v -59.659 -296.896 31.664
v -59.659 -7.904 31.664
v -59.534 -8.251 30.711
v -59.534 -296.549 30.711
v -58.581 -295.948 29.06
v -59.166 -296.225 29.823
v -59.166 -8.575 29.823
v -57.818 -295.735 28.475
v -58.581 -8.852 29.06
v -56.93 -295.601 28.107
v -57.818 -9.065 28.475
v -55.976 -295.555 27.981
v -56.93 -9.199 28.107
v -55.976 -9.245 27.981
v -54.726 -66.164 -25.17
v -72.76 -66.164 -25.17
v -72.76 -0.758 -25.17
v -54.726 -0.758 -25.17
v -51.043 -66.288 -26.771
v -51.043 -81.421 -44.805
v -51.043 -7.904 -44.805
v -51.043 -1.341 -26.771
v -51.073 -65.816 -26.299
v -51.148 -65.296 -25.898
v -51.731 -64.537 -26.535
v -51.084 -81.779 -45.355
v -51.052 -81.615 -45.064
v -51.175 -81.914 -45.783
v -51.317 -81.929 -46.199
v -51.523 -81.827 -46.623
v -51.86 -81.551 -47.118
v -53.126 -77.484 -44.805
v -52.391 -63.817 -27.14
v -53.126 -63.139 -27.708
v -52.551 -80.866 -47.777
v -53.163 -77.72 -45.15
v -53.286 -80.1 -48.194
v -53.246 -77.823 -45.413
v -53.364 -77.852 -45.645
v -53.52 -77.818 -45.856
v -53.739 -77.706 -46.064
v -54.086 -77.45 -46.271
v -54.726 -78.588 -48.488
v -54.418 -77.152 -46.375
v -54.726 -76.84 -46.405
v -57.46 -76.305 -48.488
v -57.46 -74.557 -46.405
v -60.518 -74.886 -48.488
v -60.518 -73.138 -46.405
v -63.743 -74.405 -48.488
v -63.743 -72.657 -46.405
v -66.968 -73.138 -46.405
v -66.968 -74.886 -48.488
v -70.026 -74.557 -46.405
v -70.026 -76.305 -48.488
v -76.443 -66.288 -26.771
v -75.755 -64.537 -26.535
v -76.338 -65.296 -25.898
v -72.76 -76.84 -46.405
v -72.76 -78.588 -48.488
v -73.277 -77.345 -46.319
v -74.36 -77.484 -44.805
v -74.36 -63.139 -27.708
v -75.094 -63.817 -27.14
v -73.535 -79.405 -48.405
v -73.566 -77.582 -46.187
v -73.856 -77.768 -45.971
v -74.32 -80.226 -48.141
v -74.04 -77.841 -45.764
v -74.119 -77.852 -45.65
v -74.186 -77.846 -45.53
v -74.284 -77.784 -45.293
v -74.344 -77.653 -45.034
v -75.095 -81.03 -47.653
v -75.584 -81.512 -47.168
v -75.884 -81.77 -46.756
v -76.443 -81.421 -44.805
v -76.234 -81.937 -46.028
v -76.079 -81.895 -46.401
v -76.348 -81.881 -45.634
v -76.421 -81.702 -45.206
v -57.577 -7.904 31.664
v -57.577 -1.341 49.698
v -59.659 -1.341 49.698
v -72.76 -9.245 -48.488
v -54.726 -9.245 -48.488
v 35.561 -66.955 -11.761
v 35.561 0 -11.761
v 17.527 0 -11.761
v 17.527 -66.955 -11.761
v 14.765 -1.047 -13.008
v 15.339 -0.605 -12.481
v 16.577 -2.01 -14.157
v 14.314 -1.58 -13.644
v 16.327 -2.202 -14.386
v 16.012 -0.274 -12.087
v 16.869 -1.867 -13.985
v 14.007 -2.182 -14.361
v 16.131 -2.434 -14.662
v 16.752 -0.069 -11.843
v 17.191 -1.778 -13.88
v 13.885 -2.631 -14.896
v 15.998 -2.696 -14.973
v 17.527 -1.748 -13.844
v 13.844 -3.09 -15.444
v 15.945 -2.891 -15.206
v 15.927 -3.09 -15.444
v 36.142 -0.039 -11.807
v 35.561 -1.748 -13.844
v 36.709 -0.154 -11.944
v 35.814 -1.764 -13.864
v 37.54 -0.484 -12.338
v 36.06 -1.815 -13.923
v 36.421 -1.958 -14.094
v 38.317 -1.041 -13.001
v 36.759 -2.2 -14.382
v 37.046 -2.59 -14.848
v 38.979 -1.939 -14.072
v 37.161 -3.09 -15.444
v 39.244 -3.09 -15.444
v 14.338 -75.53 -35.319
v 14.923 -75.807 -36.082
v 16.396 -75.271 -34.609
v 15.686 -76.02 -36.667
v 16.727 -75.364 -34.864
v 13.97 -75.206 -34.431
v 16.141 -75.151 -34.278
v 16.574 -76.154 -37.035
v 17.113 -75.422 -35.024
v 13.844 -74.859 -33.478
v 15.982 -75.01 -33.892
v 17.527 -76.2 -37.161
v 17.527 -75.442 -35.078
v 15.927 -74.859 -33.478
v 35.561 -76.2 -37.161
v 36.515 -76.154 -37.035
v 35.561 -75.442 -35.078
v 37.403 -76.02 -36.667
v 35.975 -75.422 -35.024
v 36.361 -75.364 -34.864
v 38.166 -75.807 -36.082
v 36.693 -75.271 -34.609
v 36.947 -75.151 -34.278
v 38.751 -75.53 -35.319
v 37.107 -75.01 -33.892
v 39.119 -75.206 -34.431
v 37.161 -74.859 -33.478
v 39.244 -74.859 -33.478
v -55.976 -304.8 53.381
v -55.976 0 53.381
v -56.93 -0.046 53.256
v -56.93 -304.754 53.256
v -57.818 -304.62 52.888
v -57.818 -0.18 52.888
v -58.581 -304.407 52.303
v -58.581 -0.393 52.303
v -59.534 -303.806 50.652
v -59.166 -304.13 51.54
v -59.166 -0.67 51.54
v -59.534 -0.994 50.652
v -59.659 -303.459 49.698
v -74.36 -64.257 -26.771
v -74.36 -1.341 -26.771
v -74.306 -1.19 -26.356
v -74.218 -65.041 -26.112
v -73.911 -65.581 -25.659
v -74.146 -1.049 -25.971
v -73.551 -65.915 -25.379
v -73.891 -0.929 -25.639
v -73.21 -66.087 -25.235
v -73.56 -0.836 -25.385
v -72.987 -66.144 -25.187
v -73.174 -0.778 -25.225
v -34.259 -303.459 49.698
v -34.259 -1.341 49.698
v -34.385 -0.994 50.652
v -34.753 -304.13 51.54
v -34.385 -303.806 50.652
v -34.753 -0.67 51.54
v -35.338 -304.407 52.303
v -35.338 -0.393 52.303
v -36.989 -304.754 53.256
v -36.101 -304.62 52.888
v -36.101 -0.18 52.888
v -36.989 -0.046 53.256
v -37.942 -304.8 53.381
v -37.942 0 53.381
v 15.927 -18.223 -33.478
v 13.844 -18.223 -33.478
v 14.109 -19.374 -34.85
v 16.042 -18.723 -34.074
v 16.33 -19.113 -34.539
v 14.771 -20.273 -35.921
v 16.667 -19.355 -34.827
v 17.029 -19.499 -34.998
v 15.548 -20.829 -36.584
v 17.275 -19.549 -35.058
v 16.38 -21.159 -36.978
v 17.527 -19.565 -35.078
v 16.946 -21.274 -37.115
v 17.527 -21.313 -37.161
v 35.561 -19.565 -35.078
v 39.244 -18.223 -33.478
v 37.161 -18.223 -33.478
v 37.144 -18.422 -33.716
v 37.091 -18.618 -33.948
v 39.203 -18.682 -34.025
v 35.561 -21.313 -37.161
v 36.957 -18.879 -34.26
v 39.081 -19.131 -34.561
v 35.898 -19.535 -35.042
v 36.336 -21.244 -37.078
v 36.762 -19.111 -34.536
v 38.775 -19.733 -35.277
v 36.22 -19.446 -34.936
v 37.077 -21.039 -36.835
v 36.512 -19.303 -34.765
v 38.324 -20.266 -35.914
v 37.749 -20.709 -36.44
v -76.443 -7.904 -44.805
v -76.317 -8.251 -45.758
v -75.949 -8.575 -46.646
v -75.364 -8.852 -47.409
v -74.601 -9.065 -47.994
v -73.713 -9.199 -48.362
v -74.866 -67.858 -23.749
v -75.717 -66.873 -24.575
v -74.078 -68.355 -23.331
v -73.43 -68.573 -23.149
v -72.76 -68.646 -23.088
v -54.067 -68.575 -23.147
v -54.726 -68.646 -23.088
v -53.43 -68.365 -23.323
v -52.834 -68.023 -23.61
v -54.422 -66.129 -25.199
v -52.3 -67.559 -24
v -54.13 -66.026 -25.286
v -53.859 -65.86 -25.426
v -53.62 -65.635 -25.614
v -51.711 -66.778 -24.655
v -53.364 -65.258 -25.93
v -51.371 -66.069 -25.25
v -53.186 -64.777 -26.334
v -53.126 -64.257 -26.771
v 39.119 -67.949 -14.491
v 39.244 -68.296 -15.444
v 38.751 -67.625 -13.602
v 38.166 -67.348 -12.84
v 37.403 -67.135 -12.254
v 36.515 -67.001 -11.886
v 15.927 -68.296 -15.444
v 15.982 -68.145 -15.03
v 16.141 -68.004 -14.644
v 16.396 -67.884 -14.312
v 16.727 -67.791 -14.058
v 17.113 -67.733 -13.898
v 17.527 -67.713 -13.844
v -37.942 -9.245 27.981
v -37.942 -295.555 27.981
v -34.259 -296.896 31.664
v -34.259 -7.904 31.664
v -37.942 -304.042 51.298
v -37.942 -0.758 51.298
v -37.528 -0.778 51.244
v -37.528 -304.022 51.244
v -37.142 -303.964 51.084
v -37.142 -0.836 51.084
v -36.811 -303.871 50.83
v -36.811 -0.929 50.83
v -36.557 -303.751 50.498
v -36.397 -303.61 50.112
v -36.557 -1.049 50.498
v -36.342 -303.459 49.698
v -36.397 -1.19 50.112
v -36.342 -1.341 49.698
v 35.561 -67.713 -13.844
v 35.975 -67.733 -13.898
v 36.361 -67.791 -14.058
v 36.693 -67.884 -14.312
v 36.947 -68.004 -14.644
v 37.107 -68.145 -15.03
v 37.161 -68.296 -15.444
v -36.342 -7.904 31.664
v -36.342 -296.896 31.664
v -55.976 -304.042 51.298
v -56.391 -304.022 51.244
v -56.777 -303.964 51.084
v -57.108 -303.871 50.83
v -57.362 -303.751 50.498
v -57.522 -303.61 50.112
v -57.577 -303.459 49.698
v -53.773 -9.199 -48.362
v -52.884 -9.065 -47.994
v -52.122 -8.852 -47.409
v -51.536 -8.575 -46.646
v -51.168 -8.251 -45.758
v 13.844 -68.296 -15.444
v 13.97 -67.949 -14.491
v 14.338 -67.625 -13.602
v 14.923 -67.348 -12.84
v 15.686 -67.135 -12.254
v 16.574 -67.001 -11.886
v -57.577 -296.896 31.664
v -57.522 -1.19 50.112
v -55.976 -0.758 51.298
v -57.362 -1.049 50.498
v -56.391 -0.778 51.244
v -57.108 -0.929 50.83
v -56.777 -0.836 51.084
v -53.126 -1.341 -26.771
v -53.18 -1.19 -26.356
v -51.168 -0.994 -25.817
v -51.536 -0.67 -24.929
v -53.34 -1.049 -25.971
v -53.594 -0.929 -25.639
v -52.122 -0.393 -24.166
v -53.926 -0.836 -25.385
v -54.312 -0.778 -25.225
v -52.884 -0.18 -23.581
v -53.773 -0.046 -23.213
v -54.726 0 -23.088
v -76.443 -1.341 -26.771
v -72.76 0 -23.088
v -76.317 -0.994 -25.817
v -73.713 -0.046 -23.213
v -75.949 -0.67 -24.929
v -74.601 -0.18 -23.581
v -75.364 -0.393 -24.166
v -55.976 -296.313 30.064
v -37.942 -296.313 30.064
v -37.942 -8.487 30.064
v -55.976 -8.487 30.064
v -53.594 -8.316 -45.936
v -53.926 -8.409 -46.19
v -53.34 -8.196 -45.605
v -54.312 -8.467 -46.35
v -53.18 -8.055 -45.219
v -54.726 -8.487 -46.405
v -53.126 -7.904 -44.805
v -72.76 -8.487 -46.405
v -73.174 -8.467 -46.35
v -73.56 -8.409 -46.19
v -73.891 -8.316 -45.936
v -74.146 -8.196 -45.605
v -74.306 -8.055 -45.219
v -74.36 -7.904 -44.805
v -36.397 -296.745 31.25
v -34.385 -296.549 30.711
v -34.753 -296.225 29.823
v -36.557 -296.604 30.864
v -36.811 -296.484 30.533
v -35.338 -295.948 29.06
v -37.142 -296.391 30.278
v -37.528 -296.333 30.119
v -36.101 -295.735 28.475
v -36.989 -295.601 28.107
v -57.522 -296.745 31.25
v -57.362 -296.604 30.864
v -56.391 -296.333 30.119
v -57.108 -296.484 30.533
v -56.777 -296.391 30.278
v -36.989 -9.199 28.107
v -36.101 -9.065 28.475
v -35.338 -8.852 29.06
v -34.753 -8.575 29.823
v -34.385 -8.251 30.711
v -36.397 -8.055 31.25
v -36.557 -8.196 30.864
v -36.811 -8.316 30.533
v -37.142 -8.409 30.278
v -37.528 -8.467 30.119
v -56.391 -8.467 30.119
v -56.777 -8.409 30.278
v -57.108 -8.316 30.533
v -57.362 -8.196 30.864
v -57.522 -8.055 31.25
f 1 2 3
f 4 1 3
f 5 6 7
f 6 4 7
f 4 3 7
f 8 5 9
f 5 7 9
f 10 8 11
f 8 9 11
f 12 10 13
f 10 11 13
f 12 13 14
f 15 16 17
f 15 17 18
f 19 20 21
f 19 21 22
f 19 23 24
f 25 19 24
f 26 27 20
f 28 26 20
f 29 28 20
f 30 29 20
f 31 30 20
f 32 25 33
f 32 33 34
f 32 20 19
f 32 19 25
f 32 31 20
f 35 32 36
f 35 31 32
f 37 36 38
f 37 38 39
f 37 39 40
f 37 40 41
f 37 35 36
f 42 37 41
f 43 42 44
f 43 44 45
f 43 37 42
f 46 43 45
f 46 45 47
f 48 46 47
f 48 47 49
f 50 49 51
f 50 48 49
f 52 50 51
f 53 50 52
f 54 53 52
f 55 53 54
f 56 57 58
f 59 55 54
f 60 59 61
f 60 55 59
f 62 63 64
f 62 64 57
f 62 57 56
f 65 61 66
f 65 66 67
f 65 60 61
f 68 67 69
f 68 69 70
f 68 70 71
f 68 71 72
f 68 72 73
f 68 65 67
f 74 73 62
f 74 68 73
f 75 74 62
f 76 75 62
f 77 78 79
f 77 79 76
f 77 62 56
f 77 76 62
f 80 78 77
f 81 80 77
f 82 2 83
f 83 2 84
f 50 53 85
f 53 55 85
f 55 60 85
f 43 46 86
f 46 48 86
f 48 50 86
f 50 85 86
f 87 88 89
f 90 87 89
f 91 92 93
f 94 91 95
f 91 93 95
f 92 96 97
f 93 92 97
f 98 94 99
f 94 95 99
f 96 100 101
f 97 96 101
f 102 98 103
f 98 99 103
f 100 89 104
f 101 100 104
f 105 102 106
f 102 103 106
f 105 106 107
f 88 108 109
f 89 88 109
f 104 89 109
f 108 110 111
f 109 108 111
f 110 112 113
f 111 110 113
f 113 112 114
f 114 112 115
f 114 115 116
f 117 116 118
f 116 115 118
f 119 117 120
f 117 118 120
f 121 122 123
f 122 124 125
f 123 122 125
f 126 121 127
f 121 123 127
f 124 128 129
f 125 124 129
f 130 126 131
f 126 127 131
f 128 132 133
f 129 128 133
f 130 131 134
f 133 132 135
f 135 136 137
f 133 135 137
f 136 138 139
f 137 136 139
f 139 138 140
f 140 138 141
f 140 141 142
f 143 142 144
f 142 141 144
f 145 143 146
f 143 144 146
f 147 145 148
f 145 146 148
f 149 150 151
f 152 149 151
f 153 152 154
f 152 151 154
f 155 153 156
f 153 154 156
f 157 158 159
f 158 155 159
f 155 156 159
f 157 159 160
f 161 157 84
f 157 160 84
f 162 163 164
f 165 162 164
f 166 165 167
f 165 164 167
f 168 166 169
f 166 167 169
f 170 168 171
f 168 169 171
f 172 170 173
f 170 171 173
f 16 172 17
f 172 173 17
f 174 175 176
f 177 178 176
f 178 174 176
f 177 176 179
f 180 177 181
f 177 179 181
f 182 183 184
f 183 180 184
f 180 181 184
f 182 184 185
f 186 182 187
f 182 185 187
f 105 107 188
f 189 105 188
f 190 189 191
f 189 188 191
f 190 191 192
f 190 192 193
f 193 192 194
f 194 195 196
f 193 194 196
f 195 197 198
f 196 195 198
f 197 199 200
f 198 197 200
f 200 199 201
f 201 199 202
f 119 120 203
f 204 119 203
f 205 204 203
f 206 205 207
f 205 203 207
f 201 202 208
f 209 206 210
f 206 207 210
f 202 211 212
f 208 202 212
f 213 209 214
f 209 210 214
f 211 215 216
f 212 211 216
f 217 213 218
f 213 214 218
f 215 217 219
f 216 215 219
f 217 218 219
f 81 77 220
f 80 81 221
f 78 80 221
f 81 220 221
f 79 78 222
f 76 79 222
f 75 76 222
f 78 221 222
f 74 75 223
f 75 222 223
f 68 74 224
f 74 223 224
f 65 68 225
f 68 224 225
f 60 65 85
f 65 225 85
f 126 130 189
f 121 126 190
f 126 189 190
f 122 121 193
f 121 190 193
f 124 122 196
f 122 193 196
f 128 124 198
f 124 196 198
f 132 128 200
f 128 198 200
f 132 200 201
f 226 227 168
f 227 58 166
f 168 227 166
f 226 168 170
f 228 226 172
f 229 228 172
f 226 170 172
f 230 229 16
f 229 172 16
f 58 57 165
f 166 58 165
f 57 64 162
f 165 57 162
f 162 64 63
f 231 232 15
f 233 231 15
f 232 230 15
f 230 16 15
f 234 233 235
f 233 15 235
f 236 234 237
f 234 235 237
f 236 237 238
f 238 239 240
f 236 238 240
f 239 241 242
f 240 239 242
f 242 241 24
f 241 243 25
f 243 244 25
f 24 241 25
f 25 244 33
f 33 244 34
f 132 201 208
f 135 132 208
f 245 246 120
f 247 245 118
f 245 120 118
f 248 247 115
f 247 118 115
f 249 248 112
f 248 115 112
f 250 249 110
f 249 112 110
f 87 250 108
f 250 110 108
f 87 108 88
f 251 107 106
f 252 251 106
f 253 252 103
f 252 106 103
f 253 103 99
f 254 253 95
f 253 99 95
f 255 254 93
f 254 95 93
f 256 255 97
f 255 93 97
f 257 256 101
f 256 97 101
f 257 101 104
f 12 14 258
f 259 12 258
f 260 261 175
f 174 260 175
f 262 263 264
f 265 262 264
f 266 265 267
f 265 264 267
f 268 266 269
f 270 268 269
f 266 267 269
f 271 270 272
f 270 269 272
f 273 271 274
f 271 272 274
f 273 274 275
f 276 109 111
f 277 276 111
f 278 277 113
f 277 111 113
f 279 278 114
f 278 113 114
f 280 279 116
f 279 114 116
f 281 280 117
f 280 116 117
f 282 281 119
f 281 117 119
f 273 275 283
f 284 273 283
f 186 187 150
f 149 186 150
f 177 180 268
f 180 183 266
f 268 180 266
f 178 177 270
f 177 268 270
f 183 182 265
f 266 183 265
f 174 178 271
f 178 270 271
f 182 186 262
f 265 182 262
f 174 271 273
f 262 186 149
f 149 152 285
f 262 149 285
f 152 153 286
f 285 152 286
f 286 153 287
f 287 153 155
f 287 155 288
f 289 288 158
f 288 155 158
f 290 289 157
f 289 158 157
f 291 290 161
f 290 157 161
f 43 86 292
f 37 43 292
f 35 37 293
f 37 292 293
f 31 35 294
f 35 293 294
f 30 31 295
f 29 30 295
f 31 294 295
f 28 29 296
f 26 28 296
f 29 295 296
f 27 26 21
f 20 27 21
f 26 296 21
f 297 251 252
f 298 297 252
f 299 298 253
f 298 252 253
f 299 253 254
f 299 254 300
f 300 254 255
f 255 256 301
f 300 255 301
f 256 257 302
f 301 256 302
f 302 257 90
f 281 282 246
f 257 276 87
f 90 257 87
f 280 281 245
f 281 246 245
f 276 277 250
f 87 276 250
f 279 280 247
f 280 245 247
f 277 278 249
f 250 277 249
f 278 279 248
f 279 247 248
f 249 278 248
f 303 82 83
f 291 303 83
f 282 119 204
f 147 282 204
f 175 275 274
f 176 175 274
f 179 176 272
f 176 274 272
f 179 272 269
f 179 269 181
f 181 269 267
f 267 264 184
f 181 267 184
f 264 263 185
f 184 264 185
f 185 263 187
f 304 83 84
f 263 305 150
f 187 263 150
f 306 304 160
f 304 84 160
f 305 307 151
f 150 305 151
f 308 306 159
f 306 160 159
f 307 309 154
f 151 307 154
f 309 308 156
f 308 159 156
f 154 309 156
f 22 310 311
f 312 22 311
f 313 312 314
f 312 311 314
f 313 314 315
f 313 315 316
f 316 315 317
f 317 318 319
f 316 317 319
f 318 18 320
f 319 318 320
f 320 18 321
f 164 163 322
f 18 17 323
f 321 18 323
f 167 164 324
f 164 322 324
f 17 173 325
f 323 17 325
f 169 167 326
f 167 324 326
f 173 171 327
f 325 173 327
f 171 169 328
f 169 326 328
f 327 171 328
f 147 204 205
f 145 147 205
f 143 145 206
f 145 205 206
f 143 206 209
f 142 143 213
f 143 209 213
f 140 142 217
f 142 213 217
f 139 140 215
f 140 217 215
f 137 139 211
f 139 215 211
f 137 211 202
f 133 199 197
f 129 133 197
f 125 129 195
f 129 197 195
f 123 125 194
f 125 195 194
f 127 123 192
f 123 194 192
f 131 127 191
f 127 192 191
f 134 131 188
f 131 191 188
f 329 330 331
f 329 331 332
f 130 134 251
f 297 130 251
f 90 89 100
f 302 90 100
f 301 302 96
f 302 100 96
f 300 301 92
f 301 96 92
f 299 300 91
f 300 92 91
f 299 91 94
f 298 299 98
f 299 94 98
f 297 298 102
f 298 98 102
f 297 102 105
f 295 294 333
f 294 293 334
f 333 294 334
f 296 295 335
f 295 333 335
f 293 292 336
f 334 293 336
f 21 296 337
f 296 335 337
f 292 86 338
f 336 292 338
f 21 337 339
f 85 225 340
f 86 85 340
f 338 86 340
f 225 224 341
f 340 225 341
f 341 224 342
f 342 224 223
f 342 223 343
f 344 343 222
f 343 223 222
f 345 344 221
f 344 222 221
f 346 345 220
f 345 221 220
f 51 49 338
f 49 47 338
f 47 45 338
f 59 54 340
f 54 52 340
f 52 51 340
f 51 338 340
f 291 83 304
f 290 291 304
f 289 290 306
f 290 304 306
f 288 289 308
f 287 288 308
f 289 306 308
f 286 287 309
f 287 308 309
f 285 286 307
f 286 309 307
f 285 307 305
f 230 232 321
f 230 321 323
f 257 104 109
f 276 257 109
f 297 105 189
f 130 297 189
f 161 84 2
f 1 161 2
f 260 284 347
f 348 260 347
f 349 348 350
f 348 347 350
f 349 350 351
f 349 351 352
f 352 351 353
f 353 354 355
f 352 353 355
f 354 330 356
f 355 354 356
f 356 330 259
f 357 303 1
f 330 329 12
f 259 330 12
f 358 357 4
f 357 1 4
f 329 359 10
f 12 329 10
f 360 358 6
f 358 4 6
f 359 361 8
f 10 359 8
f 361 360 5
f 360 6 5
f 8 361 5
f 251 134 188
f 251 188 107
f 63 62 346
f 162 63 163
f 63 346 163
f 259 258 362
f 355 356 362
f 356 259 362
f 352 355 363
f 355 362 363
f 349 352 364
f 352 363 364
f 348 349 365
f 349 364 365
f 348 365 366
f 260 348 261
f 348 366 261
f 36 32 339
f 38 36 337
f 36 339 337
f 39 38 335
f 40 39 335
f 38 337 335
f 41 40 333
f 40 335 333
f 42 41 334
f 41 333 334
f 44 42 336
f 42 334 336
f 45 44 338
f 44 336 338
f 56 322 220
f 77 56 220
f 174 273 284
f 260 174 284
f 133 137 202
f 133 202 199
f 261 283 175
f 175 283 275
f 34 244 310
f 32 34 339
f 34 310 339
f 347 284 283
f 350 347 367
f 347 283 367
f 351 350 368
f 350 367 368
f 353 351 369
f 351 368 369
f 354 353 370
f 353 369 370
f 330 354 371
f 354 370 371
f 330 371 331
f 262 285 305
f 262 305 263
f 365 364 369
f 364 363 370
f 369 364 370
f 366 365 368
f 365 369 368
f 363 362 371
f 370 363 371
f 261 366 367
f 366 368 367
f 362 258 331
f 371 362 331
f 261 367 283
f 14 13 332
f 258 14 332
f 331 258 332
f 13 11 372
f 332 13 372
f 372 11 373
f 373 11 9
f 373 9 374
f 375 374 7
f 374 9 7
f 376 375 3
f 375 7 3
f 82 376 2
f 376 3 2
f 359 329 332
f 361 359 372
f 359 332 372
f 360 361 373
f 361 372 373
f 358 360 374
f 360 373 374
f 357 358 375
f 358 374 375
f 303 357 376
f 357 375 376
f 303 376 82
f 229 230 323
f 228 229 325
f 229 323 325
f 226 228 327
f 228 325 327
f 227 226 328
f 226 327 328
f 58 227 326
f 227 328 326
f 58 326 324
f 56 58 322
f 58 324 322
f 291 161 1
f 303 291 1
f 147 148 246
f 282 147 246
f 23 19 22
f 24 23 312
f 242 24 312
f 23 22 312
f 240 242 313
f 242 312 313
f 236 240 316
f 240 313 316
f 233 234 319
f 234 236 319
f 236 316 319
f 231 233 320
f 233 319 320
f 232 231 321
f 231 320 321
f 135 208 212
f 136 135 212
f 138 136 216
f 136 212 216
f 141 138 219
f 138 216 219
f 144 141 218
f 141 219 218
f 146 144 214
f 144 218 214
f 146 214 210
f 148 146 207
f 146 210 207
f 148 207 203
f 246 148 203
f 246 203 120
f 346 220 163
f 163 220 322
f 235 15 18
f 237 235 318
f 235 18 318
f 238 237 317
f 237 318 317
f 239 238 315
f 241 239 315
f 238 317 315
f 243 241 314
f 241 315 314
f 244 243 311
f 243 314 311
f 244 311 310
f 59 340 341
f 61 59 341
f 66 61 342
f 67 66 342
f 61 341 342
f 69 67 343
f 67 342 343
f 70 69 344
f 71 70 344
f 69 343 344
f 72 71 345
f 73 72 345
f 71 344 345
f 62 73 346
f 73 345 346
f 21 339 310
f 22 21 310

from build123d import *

# Parameters (mm, degrees)
F1_DEPTH  = 304.8
F3_DEPTH  = 101.6
F5_DEPTH  = 25.4
F7_DEPTH  = 25.4
F10_R     = 14.2875
F11_DEPTH = 40.64
F13_DEPTH = 76.2
F15_DEPTH = 25.4


with BuildPart() as f1:
    # F0 (on Front) → F1 (new body)
    with BuildSketch(Plane.XZ):
        with BuildLine():
            Line((-37.9424992715, 53.3812791109), (-55.9764980507, 53.3812791109))
            ThreePointArc((-55.9764980507, 53.3812791109), (-58.5807727574, 52.3025532072), (-59.6594986611, 49.6982785005))
            Line((-59.6594986611, 49.6982785005), (-59.6594986611, 31.6642797213))
            ThreePointArc((-59.6594986611, 31.6642797213), (-58.5807727574, 29.0600050146), (-55.9764980507, 27.9812791109))
            Line((-55.9764980507, 27.9812791109), (-37.9424992715, 27.9812791109))
            ThreePointArc((-37.9424992715, 27.9812791109), (-35.3382245648, 29.0600050146), (-34.2594986611, 31.6642797213))
            Line((-34.2594986611, 31.6642797213), (-34.2594986611, 49.6982785005))
            ThreePointArc((-34.2594986611, 49.6982785005), (-35.3382245648, 52.3025532072), (-37.9424992715, 53.3812791109))
        make_face()
        with BuildLine():
            ThreePointArc((-57.5766980507, 49.6982785005), (-57.108010322, 50.8297907718), (-55.9764980507, 51.2984785005))
            Line((-55.9764980507, 51.2984785005), (-37.9424992715, 51.2984785005))
            ThreePointArc((-37.9424992715, 51.2984785005), (-36.8109870002, 50.8297907718), (-36.3422992715, 49.6982785005))
            Line((-36.3422992715, 49.6982785005), (-36.3422992715, 31.6642797213))
            ThreePointArc((-36.3422992715, 31.6642797213), (-36.8109870002, 30.53276745), (-37.9424992715, 30.0640797213))
            Line((-37.9424992715, 30.0640797213), (-55.9764980507, 30.0640797213))
            ThreePointArc((-55.9764980507, 30.0640797213), (-57.108010322, 30.53276745), (-57.5766980507, 31.6642797213))
            Line((-57.5766980507, 31.6642797213), (-57.5766980507, 49.6982785005))
        make_face(mode=Mode.SUBTRACT)
    extrude(amount=F1_DEPTH)

    # F4 (on face) → F5 (cut, through all)
    with BuildSketch(Plane(origin=(-59.6594986611, 0, 0), x_dir=(0, -1, 0), z_dir=(-1, 0, 0))):
        Polygon((7.9043413554, 31.6642797213), (1.340502595, 49.6982785005), (0, 49.6982785005), (0, 31.6642797213), align=None)
        Polygon((1.340502595, 49.6982785005), (0, 53.3812791109), (0, 49.6982785005), align=None)
        Polygon((9.2448439504, 27.9812791109), (7.9043413554, 31.6642797213), (0, 31.6642797213), (0, 27.9812791109), align=None)
        Polygon((304.8, 53.3812791109), (303.459497405, 49.6982785005), (304.8, 49.6982785005), align=None)
        Polygon((304.8, 49.6982785005), (303.459497405, 49.6982785005), (296.8956586446, 31.6642797213), (304.8, 31.6642797213), align=None)
        Polygon((304.8, 31.6642797213), (296.8956586446, 31.6642797213), (295.5551560496, 27.9812791109), (304.8, 27.9812791109), align=None)
    extrude(amount=-F5_DEPTH, mode=Mode.SUBTRACT)


with BuildPart() as f3:
    # F2 (on Front) → F3 (new body)
    with BuildSketch(Plane.XZ):
        with BuildLine():
            Line((-54.7259064655, -23.0876084745), (-72.7599052448, -23.0876084745))
            ThreePointArc((-72.7599052448, -23.0876084745), (-75.3641799515, -24.1663343782), (-76.4429058552, -26.7706090849))
            Line((-76.4429058552, -26.7706090849), (-76.4429058552, -44.8046078641))
            ThreePointArc((-76.4429058552, -44.8046078641), (-75.3641799515, -47.4088825708), (-72.7599052448, -48.4876084745))
            Line((-72.7599052448, -48.4876084745), (-54.7259064655, -48.4876084745))
            ThreePointArc((-54.7259064655, -48.4876084745), (-52.1216317588, -47.4088825708), (-51.0429058552, -44.8046078641))
            Line((-51.0429058552, -44.8046078641), (-51.0429058552, -26.7706090849))
            ThreePointArc((-51.0429058552, -26.7706090849), (-52.1216317588, -24.1663343782), (-54.7259064655, -23.0876084745))
        make_face()
        with BuildLine():
            ThreePointArc((-74.3601052448, -26.7706090849), (-73.8914175161, -25.6390968136), (-72.7599052448, -25.1704090849))
            Line((-72.7599052448, -25.1704090849), (-54.7259064655, -25.1704090849))
            ThreePointArc((-54.7259064655, -25.1704090849), (-53.5943941943, -25.6390968136), (-53.1257064655, -26.7706090849))
            Line((-53.1257064655, -26.7706090849), (-53.1257064655, -44.8046078641))
            ThreePointArc((-53.1257064655, -44.8046078641), (-53.5943941943, -45.9361201354), (-54.7259064655, -46.4048078641))
            Line((-54.7259064655, -46.4048078641), (-72.7599052448, -46.4048078641))
            ThreePointArc((-72.7599052448, -46.4048078641), (-73.8914175161, -45.9361201354), (-74.3601052448, -44.8046078641))
            Line((-74.3601052448, -44.8046078641), (-74.3601052448, -26.7706090849))
        make_face(mode=Mode.SUBTRACT)
    extrude(amount=F3_DEPTH)

    # F6 (on face) → F7 (cut, through all)
    with BuildSketch(Plane(origin=(-76.4429058552, 0, 0), x_dir=(0, -1, 0), z_dir=(-1, 0, 0))):
        Polygon((1.340502595, -26.7706090849), (0, -26.7706090849), (0, -44.8046078641), (7.9043413554, -44.8046078641), align=None)
        Polygon((7.9043413554, -44.8046078641), (0, -44.8046078641), (0, -48.4876084745), (9.2448439504, -48.4876084745), align=None)
        Polygon((1.340502595, -26.7706090849), (0, -23.0876084745), (0, -26.7706090849), align=None)
        Polygon((80.2868693681, -23.0876084745), (83.3772738219, -26.7706090849), (101.6, -26.7706090849), (101.6, -23.0876084745), align=None)
        Polygon((101.6, -26.7706090849), (83.3772738219, -26.7706090849), (98.5095955462, -44.8046078641), (101.6, -44.8046078641), align=None)
        Polygon((101.6, -44.8046078641), (98.5095955462, -44.8046078641), (101.6, -48.4876084745), align=None)
    extrude(amount=-F7_DEPTH, mode=Mode.SUBTRACT)

    # F10 (on face) → F11 (cut)
    with BuildSketch(Plane(origin=(0, -65.8541589499, -78.4819305158), x_dir=(1, 0, 0), z_dir=(0, 0.6427876097, 0.7660444431))):
        with Locations((-63.7429058552, -40.1174512895)):
            Circle(F10_R)
    extrude(amount=F11_DEPTH, mode=Mode.SUBTRACT)


with BuildPart() as f13:
    # F12 (on Front) → F13 (new body)
    with BuildSketch(Plane.XZ):
        with BuildLine():
            Line((35.5612983663, -11.7608893991), (17.527299587, -11.7608893991))
            ThreePointArc((17.527299587, -11.7608893991), (14.9230248803, -12.8396153027), (13.8442989767, -15.4438900094))
            Line((13.8442989767, -15.4438900094), (13.8442989767, -33.4778887887))
            ThreePointArc((13.8442989767, -33.4778887887), (14.9230248803, -36.0821634954), (17.527299587, -37.1608893991))
            Line((17.527299587, -37.1608893991), (35.5612983663, -37.1608893991))
            ThreePointArc((35.5612983663, -37.1608893991), (38.165573073, -36.0821634954), (39.2442989767, -33.4778887887))
            Line((39.2442989767, -33.4778887887), (39.2442989767, -15.4438900094))
            ThreePointArc((39.2442989767, -15.4438900094), (38.165573073, -12.8396153027), (35.5612983663, -11.7608893991))
        make_face()
        with BuildLine():
            ThreePointArc((15.927099587, -15.4438900094), (16.3957873158, -14.3123777382), (17.527299587, -13.8436900094))
            Line((17.527299587, -13.8436900094), (35.5612983663, -13.8436900094))
            ThreePointArc((35.5612983663, -13.8436900094), (36.6928106376, -14.3123777382), (37.1614983663, -15.4438900094))
            Line((37.1614983663, -15.4438900094), (37.1614983663, -33.4778887887))
            ThreePointArc((37.1614983663, -33.4778887887), (36.6928106376, -34.6094010599), (35.5612983663, -35.0780887887))
            Line((35.5612983663, -35.0780887887), (17.527299587, -35.0780887887))
            ThreePointArc((17.527299587, -35.0780887887), (16.3957873158, -34.6094010599), (15.927099587, -33.4778887887))
            Line((15.927099587, -33.4778887887), (15.927099587, -15.4438900094))
        make_face(mode=Mode.SUBTRACT)
    extrude(amount=F13_DEPTH)

    # F14 (on face) → F15 (cut, through all)
    with BuildSketch(Plane.YZ.offset(39.2442989767)):
        Polygon((-76.2, -15.4438900094), (-68.2956586446, -15.4438900094), (-66.9551560496, -11.7608893991), (-76.2, -11.7608893991), align=None)
        Polygon((-74.859497405, -33.4778887887), (-68.2956586446, -15.4438900094), (-76.2, -15.4438900094), (-76.2, -33.4778887887), align=None)
        Polygon((-76.2, -37.1608893991), (-74.859497405, -33.4778887887), (-76.2, -33.4778887887), align=None)
        Polygon((0, -33.4778887887), (-18.2227261781, -33.4778887887), (-21.3131306319, -37.1608893991), (0, -37.1608893991), align=None)
        Polygon((0, -15.4438900094), (-3.0904044538, -15.4438900094), (-18.2227261781, -33.4778887887), (0, -33.4778887887), align=None)
        Polygon((0, -15.4438900094), (0, -11.7608893991), (-3.0904044538, -15.4438900094), align=None)
    extrude(amount=-F15_DEPTH, mode=Mode.SUBTRACT)


solid = Compound([f1.part, f3.part, f13.part])
